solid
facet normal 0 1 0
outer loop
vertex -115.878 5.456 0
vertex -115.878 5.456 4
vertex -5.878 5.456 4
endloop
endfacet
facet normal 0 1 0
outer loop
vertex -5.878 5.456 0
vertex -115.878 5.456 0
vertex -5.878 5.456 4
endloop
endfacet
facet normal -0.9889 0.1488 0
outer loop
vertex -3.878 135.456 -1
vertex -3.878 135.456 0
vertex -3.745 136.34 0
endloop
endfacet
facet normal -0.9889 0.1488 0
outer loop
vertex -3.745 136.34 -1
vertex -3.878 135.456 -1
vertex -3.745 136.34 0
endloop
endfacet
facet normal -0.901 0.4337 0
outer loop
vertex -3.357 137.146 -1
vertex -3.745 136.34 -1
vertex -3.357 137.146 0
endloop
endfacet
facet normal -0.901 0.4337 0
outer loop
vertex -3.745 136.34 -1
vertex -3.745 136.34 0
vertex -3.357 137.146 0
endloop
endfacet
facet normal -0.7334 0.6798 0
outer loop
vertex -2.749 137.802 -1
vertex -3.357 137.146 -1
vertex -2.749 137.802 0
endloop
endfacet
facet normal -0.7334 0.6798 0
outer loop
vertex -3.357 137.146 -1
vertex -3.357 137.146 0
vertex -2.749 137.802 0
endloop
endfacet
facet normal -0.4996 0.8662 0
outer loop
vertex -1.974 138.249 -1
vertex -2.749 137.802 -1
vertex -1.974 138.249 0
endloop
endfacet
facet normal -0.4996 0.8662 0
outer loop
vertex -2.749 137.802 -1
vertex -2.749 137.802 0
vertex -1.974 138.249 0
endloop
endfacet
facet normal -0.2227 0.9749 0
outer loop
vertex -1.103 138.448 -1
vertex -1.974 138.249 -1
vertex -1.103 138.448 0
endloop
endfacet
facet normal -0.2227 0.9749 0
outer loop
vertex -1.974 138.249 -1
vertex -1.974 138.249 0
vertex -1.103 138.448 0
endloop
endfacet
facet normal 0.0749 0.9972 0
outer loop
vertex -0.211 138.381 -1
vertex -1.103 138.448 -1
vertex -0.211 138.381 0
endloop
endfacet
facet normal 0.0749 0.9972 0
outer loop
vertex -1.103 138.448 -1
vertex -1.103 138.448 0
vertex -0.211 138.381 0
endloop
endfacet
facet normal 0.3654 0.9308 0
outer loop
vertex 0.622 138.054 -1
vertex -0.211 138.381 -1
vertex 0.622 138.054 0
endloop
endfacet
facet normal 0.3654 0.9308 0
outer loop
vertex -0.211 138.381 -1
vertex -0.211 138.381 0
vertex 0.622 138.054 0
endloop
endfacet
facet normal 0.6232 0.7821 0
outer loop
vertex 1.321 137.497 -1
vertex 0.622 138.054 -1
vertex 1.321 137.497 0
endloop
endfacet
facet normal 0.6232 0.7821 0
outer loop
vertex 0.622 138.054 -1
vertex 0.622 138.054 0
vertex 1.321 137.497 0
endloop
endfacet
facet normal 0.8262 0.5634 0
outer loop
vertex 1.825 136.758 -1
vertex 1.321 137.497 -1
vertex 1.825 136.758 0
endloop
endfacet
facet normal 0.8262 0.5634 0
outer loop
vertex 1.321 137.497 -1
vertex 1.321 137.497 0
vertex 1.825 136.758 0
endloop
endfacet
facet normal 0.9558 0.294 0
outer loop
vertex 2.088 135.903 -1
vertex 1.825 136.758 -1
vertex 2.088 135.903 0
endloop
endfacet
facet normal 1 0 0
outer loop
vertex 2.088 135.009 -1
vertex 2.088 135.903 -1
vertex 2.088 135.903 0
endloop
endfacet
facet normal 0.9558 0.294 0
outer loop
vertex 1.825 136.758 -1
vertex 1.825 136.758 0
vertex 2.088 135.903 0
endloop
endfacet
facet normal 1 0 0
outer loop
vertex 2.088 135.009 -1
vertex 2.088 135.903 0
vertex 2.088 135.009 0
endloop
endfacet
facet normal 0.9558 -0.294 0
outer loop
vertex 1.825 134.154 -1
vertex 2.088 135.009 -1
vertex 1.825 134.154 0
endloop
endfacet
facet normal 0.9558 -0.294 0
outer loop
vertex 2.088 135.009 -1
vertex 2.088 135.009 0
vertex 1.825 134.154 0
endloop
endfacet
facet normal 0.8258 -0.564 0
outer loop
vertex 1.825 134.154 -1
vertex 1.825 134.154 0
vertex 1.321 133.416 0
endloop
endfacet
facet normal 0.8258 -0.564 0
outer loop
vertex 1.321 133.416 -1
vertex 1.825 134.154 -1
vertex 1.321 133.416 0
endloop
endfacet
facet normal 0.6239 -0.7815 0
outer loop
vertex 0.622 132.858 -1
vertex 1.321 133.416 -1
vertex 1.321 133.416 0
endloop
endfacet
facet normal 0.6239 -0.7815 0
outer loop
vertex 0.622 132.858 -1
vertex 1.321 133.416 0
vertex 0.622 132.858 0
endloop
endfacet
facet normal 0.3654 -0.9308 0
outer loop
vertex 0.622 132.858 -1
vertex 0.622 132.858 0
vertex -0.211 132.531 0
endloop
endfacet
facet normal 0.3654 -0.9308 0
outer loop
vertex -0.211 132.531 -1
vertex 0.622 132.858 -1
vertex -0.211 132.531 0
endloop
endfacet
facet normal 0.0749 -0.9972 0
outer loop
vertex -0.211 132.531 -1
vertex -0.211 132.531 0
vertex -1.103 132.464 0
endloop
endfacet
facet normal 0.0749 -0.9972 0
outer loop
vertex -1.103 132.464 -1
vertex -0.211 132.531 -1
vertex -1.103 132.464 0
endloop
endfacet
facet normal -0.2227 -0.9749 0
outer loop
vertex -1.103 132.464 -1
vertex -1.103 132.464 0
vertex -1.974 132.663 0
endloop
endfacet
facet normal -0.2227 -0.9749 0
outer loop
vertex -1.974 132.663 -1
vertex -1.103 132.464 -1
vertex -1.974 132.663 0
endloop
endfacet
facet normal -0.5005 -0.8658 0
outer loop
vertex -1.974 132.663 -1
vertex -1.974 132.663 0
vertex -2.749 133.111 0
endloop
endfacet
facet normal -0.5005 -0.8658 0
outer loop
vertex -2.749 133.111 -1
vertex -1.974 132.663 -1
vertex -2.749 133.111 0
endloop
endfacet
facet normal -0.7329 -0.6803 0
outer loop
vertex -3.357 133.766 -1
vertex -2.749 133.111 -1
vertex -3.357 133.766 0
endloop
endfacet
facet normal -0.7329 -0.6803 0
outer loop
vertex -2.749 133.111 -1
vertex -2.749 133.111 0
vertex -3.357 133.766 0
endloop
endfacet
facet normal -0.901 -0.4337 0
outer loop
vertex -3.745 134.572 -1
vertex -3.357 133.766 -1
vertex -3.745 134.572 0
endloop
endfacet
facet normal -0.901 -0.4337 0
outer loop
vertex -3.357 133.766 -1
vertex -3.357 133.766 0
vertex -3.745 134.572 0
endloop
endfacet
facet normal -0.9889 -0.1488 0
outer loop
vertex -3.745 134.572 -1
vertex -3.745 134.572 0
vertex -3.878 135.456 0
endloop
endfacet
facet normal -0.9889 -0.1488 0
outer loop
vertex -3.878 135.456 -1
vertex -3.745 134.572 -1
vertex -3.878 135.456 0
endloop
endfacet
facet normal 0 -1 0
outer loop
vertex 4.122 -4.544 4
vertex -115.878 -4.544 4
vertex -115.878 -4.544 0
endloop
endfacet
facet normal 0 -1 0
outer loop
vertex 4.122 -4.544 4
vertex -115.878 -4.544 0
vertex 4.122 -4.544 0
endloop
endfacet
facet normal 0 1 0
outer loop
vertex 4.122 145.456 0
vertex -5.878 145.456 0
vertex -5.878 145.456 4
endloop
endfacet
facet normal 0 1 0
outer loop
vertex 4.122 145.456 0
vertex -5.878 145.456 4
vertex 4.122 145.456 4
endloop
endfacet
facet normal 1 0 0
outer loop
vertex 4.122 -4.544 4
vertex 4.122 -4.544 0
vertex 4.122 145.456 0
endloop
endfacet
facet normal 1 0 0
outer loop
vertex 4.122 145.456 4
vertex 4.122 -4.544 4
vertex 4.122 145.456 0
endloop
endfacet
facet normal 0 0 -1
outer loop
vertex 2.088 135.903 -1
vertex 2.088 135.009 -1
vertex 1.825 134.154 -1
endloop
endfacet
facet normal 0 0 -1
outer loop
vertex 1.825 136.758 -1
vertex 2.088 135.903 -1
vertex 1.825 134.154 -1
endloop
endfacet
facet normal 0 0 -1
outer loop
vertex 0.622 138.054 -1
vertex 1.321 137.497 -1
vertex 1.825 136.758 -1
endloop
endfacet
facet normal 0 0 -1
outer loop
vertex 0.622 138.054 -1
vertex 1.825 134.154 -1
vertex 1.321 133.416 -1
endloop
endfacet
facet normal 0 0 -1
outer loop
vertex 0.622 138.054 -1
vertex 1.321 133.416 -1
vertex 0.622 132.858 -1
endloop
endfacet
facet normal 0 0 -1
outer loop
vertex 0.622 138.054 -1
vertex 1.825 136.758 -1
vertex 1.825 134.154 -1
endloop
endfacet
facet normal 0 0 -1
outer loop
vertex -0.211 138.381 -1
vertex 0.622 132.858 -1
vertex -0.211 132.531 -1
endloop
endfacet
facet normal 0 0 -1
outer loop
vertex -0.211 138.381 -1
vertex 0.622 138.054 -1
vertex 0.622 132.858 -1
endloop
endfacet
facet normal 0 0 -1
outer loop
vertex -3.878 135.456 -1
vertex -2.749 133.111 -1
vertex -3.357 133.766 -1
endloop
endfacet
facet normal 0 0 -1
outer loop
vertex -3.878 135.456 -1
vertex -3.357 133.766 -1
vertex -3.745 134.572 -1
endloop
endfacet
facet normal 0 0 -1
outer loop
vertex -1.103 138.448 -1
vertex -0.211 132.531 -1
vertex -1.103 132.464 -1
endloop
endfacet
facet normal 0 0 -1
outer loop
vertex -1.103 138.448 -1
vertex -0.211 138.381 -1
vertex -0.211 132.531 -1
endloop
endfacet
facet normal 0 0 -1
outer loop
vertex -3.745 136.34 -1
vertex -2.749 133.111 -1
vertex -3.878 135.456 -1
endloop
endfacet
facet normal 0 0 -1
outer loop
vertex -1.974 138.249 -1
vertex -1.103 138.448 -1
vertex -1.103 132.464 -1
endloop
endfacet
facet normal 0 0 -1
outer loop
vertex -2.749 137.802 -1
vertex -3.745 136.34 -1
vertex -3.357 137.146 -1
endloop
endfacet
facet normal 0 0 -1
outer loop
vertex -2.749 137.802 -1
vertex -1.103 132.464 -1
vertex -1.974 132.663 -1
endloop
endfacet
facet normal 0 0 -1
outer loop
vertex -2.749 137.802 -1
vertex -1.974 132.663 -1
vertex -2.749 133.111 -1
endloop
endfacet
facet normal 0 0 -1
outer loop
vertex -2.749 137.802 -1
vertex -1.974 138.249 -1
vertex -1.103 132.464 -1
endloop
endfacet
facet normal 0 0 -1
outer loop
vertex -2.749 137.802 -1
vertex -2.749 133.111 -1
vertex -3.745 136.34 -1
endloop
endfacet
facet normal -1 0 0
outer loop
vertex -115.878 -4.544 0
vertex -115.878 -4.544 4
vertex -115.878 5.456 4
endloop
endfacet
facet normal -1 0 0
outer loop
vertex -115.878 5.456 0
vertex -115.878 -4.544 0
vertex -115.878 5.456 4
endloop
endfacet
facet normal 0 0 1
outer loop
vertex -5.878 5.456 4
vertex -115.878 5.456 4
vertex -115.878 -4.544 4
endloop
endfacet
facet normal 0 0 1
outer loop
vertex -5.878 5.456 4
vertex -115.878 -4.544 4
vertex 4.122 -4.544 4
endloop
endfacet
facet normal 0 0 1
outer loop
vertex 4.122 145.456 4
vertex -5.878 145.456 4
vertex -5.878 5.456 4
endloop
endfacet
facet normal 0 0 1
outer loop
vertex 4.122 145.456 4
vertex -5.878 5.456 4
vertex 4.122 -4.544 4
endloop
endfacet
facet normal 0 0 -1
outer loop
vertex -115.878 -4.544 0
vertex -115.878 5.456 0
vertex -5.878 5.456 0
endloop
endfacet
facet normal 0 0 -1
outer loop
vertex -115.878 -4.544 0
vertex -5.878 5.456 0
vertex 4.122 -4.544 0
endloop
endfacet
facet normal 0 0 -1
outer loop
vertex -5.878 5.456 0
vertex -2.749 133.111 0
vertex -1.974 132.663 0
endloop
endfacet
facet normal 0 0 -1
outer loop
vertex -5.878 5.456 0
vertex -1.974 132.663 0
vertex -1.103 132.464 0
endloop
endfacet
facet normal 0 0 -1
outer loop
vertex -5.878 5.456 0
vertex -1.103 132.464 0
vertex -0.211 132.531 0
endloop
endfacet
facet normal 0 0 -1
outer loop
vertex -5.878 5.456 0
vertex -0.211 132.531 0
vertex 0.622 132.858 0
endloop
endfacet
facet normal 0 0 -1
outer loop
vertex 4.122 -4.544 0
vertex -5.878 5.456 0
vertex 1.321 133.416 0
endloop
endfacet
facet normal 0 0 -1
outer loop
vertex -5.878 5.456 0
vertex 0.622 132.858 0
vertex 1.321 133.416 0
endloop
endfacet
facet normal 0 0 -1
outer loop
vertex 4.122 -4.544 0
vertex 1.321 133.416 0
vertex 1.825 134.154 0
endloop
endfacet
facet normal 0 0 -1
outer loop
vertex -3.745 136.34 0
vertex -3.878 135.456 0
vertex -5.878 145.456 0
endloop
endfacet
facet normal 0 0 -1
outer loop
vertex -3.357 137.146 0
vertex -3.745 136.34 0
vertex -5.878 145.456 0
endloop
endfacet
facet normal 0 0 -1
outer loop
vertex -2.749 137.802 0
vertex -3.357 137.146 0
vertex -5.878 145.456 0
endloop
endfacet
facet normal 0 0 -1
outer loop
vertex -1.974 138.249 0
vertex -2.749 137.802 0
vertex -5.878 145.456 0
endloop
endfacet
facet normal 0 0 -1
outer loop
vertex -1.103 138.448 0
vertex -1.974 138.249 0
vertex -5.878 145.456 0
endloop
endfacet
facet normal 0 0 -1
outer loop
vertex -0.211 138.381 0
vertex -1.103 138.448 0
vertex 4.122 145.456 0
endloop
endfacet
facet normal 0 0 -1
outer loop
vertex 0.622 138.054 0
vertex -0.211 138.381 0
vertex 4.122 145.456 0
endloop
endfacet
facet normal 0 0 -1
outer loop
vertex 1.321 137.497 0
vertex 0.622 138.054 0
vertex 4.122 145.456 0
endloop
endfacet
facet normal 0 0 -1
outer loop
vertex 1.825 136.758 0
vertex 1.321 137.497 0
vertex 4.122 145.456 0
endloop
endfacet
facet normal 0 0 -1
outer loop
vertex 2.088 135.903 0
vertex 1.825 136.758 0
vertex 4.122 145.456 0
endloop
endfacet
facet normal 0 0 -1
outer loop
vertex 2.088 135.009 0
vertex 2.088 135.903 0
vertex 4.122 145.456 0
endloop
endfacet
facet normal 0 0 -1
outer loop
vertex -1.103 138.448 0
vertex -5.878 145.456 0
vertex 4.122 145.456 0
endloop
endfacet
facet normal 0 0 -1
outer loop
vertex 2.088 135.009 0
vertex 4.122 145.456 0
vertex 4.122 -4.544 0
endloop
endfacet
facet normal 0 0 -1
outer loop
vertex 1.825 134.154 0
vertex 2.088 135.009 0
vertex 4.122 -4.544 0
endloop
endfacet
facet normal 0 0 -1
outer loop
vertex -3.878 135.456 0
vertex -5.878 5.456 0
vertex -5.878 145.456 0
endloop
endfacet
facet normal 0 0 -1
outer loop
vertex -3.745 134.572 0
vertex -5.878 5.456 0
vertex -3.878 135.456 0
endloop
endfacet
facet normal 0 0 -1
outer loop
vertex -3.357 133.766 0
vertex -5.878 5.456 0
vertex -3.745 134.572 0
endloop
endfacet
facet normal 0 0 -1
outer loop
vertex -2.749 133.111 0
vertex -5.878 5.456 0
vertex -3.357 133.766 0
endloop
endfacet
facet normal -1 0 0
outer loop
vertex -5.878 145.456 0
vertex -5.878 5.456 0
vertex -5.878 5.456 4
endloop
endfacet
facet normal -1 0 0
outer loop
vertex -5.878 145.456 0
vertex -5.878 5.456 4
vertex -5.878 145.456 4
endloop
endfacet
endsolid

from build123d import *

# Parameters (mm, degrees)
SKETCH_1_W      = 10
SKETCH_1_H      = 150
EXTRUDE_1_DEPTH = 4
SKETCH_2_W      = 110
SKETCH_2_H      = 10
EXTRUDE_2_DEPTH = 4
SKETCH_3_R      = 3
EXTRUDE_3_DEPTH = 1


with BuildPart() as part:
    # 草图1 → 凸台-拉伸1 (new body)
    with BuildSketch(Plane.XY):
        with Locations((-0.878378378, 70.456081081)):
            Rectangle(SKETCH_1_W, SKETCH_1_H)
    extrude(amount=EXTRUDE_1_DEPTH)

    # 草图2 → 凸台-拉伸2 (add)
    with BuildSketch(Plane.XY.offset(4)):
        with Locations((-60.878378378, 0.456081081)):
            Rectangle(SKETCH_2_W, SKETCH_2_H)
    extrude(amount=-EXTRUDE_2_DEPTH)

    # 草图3 → 凸台-拉伸3 (add)
    with BuildSketch(Plane(origin=(0, 0, 0), x_dir=(-1, 0, 0), z_dir=(0, 0, -1))):
        with Locations((0.878378378, 135.456081081)):
            Circle(SKETCH_3_R)
    extrude(amount=EXTRUDE_3_DEPTH)


solid = part.part
